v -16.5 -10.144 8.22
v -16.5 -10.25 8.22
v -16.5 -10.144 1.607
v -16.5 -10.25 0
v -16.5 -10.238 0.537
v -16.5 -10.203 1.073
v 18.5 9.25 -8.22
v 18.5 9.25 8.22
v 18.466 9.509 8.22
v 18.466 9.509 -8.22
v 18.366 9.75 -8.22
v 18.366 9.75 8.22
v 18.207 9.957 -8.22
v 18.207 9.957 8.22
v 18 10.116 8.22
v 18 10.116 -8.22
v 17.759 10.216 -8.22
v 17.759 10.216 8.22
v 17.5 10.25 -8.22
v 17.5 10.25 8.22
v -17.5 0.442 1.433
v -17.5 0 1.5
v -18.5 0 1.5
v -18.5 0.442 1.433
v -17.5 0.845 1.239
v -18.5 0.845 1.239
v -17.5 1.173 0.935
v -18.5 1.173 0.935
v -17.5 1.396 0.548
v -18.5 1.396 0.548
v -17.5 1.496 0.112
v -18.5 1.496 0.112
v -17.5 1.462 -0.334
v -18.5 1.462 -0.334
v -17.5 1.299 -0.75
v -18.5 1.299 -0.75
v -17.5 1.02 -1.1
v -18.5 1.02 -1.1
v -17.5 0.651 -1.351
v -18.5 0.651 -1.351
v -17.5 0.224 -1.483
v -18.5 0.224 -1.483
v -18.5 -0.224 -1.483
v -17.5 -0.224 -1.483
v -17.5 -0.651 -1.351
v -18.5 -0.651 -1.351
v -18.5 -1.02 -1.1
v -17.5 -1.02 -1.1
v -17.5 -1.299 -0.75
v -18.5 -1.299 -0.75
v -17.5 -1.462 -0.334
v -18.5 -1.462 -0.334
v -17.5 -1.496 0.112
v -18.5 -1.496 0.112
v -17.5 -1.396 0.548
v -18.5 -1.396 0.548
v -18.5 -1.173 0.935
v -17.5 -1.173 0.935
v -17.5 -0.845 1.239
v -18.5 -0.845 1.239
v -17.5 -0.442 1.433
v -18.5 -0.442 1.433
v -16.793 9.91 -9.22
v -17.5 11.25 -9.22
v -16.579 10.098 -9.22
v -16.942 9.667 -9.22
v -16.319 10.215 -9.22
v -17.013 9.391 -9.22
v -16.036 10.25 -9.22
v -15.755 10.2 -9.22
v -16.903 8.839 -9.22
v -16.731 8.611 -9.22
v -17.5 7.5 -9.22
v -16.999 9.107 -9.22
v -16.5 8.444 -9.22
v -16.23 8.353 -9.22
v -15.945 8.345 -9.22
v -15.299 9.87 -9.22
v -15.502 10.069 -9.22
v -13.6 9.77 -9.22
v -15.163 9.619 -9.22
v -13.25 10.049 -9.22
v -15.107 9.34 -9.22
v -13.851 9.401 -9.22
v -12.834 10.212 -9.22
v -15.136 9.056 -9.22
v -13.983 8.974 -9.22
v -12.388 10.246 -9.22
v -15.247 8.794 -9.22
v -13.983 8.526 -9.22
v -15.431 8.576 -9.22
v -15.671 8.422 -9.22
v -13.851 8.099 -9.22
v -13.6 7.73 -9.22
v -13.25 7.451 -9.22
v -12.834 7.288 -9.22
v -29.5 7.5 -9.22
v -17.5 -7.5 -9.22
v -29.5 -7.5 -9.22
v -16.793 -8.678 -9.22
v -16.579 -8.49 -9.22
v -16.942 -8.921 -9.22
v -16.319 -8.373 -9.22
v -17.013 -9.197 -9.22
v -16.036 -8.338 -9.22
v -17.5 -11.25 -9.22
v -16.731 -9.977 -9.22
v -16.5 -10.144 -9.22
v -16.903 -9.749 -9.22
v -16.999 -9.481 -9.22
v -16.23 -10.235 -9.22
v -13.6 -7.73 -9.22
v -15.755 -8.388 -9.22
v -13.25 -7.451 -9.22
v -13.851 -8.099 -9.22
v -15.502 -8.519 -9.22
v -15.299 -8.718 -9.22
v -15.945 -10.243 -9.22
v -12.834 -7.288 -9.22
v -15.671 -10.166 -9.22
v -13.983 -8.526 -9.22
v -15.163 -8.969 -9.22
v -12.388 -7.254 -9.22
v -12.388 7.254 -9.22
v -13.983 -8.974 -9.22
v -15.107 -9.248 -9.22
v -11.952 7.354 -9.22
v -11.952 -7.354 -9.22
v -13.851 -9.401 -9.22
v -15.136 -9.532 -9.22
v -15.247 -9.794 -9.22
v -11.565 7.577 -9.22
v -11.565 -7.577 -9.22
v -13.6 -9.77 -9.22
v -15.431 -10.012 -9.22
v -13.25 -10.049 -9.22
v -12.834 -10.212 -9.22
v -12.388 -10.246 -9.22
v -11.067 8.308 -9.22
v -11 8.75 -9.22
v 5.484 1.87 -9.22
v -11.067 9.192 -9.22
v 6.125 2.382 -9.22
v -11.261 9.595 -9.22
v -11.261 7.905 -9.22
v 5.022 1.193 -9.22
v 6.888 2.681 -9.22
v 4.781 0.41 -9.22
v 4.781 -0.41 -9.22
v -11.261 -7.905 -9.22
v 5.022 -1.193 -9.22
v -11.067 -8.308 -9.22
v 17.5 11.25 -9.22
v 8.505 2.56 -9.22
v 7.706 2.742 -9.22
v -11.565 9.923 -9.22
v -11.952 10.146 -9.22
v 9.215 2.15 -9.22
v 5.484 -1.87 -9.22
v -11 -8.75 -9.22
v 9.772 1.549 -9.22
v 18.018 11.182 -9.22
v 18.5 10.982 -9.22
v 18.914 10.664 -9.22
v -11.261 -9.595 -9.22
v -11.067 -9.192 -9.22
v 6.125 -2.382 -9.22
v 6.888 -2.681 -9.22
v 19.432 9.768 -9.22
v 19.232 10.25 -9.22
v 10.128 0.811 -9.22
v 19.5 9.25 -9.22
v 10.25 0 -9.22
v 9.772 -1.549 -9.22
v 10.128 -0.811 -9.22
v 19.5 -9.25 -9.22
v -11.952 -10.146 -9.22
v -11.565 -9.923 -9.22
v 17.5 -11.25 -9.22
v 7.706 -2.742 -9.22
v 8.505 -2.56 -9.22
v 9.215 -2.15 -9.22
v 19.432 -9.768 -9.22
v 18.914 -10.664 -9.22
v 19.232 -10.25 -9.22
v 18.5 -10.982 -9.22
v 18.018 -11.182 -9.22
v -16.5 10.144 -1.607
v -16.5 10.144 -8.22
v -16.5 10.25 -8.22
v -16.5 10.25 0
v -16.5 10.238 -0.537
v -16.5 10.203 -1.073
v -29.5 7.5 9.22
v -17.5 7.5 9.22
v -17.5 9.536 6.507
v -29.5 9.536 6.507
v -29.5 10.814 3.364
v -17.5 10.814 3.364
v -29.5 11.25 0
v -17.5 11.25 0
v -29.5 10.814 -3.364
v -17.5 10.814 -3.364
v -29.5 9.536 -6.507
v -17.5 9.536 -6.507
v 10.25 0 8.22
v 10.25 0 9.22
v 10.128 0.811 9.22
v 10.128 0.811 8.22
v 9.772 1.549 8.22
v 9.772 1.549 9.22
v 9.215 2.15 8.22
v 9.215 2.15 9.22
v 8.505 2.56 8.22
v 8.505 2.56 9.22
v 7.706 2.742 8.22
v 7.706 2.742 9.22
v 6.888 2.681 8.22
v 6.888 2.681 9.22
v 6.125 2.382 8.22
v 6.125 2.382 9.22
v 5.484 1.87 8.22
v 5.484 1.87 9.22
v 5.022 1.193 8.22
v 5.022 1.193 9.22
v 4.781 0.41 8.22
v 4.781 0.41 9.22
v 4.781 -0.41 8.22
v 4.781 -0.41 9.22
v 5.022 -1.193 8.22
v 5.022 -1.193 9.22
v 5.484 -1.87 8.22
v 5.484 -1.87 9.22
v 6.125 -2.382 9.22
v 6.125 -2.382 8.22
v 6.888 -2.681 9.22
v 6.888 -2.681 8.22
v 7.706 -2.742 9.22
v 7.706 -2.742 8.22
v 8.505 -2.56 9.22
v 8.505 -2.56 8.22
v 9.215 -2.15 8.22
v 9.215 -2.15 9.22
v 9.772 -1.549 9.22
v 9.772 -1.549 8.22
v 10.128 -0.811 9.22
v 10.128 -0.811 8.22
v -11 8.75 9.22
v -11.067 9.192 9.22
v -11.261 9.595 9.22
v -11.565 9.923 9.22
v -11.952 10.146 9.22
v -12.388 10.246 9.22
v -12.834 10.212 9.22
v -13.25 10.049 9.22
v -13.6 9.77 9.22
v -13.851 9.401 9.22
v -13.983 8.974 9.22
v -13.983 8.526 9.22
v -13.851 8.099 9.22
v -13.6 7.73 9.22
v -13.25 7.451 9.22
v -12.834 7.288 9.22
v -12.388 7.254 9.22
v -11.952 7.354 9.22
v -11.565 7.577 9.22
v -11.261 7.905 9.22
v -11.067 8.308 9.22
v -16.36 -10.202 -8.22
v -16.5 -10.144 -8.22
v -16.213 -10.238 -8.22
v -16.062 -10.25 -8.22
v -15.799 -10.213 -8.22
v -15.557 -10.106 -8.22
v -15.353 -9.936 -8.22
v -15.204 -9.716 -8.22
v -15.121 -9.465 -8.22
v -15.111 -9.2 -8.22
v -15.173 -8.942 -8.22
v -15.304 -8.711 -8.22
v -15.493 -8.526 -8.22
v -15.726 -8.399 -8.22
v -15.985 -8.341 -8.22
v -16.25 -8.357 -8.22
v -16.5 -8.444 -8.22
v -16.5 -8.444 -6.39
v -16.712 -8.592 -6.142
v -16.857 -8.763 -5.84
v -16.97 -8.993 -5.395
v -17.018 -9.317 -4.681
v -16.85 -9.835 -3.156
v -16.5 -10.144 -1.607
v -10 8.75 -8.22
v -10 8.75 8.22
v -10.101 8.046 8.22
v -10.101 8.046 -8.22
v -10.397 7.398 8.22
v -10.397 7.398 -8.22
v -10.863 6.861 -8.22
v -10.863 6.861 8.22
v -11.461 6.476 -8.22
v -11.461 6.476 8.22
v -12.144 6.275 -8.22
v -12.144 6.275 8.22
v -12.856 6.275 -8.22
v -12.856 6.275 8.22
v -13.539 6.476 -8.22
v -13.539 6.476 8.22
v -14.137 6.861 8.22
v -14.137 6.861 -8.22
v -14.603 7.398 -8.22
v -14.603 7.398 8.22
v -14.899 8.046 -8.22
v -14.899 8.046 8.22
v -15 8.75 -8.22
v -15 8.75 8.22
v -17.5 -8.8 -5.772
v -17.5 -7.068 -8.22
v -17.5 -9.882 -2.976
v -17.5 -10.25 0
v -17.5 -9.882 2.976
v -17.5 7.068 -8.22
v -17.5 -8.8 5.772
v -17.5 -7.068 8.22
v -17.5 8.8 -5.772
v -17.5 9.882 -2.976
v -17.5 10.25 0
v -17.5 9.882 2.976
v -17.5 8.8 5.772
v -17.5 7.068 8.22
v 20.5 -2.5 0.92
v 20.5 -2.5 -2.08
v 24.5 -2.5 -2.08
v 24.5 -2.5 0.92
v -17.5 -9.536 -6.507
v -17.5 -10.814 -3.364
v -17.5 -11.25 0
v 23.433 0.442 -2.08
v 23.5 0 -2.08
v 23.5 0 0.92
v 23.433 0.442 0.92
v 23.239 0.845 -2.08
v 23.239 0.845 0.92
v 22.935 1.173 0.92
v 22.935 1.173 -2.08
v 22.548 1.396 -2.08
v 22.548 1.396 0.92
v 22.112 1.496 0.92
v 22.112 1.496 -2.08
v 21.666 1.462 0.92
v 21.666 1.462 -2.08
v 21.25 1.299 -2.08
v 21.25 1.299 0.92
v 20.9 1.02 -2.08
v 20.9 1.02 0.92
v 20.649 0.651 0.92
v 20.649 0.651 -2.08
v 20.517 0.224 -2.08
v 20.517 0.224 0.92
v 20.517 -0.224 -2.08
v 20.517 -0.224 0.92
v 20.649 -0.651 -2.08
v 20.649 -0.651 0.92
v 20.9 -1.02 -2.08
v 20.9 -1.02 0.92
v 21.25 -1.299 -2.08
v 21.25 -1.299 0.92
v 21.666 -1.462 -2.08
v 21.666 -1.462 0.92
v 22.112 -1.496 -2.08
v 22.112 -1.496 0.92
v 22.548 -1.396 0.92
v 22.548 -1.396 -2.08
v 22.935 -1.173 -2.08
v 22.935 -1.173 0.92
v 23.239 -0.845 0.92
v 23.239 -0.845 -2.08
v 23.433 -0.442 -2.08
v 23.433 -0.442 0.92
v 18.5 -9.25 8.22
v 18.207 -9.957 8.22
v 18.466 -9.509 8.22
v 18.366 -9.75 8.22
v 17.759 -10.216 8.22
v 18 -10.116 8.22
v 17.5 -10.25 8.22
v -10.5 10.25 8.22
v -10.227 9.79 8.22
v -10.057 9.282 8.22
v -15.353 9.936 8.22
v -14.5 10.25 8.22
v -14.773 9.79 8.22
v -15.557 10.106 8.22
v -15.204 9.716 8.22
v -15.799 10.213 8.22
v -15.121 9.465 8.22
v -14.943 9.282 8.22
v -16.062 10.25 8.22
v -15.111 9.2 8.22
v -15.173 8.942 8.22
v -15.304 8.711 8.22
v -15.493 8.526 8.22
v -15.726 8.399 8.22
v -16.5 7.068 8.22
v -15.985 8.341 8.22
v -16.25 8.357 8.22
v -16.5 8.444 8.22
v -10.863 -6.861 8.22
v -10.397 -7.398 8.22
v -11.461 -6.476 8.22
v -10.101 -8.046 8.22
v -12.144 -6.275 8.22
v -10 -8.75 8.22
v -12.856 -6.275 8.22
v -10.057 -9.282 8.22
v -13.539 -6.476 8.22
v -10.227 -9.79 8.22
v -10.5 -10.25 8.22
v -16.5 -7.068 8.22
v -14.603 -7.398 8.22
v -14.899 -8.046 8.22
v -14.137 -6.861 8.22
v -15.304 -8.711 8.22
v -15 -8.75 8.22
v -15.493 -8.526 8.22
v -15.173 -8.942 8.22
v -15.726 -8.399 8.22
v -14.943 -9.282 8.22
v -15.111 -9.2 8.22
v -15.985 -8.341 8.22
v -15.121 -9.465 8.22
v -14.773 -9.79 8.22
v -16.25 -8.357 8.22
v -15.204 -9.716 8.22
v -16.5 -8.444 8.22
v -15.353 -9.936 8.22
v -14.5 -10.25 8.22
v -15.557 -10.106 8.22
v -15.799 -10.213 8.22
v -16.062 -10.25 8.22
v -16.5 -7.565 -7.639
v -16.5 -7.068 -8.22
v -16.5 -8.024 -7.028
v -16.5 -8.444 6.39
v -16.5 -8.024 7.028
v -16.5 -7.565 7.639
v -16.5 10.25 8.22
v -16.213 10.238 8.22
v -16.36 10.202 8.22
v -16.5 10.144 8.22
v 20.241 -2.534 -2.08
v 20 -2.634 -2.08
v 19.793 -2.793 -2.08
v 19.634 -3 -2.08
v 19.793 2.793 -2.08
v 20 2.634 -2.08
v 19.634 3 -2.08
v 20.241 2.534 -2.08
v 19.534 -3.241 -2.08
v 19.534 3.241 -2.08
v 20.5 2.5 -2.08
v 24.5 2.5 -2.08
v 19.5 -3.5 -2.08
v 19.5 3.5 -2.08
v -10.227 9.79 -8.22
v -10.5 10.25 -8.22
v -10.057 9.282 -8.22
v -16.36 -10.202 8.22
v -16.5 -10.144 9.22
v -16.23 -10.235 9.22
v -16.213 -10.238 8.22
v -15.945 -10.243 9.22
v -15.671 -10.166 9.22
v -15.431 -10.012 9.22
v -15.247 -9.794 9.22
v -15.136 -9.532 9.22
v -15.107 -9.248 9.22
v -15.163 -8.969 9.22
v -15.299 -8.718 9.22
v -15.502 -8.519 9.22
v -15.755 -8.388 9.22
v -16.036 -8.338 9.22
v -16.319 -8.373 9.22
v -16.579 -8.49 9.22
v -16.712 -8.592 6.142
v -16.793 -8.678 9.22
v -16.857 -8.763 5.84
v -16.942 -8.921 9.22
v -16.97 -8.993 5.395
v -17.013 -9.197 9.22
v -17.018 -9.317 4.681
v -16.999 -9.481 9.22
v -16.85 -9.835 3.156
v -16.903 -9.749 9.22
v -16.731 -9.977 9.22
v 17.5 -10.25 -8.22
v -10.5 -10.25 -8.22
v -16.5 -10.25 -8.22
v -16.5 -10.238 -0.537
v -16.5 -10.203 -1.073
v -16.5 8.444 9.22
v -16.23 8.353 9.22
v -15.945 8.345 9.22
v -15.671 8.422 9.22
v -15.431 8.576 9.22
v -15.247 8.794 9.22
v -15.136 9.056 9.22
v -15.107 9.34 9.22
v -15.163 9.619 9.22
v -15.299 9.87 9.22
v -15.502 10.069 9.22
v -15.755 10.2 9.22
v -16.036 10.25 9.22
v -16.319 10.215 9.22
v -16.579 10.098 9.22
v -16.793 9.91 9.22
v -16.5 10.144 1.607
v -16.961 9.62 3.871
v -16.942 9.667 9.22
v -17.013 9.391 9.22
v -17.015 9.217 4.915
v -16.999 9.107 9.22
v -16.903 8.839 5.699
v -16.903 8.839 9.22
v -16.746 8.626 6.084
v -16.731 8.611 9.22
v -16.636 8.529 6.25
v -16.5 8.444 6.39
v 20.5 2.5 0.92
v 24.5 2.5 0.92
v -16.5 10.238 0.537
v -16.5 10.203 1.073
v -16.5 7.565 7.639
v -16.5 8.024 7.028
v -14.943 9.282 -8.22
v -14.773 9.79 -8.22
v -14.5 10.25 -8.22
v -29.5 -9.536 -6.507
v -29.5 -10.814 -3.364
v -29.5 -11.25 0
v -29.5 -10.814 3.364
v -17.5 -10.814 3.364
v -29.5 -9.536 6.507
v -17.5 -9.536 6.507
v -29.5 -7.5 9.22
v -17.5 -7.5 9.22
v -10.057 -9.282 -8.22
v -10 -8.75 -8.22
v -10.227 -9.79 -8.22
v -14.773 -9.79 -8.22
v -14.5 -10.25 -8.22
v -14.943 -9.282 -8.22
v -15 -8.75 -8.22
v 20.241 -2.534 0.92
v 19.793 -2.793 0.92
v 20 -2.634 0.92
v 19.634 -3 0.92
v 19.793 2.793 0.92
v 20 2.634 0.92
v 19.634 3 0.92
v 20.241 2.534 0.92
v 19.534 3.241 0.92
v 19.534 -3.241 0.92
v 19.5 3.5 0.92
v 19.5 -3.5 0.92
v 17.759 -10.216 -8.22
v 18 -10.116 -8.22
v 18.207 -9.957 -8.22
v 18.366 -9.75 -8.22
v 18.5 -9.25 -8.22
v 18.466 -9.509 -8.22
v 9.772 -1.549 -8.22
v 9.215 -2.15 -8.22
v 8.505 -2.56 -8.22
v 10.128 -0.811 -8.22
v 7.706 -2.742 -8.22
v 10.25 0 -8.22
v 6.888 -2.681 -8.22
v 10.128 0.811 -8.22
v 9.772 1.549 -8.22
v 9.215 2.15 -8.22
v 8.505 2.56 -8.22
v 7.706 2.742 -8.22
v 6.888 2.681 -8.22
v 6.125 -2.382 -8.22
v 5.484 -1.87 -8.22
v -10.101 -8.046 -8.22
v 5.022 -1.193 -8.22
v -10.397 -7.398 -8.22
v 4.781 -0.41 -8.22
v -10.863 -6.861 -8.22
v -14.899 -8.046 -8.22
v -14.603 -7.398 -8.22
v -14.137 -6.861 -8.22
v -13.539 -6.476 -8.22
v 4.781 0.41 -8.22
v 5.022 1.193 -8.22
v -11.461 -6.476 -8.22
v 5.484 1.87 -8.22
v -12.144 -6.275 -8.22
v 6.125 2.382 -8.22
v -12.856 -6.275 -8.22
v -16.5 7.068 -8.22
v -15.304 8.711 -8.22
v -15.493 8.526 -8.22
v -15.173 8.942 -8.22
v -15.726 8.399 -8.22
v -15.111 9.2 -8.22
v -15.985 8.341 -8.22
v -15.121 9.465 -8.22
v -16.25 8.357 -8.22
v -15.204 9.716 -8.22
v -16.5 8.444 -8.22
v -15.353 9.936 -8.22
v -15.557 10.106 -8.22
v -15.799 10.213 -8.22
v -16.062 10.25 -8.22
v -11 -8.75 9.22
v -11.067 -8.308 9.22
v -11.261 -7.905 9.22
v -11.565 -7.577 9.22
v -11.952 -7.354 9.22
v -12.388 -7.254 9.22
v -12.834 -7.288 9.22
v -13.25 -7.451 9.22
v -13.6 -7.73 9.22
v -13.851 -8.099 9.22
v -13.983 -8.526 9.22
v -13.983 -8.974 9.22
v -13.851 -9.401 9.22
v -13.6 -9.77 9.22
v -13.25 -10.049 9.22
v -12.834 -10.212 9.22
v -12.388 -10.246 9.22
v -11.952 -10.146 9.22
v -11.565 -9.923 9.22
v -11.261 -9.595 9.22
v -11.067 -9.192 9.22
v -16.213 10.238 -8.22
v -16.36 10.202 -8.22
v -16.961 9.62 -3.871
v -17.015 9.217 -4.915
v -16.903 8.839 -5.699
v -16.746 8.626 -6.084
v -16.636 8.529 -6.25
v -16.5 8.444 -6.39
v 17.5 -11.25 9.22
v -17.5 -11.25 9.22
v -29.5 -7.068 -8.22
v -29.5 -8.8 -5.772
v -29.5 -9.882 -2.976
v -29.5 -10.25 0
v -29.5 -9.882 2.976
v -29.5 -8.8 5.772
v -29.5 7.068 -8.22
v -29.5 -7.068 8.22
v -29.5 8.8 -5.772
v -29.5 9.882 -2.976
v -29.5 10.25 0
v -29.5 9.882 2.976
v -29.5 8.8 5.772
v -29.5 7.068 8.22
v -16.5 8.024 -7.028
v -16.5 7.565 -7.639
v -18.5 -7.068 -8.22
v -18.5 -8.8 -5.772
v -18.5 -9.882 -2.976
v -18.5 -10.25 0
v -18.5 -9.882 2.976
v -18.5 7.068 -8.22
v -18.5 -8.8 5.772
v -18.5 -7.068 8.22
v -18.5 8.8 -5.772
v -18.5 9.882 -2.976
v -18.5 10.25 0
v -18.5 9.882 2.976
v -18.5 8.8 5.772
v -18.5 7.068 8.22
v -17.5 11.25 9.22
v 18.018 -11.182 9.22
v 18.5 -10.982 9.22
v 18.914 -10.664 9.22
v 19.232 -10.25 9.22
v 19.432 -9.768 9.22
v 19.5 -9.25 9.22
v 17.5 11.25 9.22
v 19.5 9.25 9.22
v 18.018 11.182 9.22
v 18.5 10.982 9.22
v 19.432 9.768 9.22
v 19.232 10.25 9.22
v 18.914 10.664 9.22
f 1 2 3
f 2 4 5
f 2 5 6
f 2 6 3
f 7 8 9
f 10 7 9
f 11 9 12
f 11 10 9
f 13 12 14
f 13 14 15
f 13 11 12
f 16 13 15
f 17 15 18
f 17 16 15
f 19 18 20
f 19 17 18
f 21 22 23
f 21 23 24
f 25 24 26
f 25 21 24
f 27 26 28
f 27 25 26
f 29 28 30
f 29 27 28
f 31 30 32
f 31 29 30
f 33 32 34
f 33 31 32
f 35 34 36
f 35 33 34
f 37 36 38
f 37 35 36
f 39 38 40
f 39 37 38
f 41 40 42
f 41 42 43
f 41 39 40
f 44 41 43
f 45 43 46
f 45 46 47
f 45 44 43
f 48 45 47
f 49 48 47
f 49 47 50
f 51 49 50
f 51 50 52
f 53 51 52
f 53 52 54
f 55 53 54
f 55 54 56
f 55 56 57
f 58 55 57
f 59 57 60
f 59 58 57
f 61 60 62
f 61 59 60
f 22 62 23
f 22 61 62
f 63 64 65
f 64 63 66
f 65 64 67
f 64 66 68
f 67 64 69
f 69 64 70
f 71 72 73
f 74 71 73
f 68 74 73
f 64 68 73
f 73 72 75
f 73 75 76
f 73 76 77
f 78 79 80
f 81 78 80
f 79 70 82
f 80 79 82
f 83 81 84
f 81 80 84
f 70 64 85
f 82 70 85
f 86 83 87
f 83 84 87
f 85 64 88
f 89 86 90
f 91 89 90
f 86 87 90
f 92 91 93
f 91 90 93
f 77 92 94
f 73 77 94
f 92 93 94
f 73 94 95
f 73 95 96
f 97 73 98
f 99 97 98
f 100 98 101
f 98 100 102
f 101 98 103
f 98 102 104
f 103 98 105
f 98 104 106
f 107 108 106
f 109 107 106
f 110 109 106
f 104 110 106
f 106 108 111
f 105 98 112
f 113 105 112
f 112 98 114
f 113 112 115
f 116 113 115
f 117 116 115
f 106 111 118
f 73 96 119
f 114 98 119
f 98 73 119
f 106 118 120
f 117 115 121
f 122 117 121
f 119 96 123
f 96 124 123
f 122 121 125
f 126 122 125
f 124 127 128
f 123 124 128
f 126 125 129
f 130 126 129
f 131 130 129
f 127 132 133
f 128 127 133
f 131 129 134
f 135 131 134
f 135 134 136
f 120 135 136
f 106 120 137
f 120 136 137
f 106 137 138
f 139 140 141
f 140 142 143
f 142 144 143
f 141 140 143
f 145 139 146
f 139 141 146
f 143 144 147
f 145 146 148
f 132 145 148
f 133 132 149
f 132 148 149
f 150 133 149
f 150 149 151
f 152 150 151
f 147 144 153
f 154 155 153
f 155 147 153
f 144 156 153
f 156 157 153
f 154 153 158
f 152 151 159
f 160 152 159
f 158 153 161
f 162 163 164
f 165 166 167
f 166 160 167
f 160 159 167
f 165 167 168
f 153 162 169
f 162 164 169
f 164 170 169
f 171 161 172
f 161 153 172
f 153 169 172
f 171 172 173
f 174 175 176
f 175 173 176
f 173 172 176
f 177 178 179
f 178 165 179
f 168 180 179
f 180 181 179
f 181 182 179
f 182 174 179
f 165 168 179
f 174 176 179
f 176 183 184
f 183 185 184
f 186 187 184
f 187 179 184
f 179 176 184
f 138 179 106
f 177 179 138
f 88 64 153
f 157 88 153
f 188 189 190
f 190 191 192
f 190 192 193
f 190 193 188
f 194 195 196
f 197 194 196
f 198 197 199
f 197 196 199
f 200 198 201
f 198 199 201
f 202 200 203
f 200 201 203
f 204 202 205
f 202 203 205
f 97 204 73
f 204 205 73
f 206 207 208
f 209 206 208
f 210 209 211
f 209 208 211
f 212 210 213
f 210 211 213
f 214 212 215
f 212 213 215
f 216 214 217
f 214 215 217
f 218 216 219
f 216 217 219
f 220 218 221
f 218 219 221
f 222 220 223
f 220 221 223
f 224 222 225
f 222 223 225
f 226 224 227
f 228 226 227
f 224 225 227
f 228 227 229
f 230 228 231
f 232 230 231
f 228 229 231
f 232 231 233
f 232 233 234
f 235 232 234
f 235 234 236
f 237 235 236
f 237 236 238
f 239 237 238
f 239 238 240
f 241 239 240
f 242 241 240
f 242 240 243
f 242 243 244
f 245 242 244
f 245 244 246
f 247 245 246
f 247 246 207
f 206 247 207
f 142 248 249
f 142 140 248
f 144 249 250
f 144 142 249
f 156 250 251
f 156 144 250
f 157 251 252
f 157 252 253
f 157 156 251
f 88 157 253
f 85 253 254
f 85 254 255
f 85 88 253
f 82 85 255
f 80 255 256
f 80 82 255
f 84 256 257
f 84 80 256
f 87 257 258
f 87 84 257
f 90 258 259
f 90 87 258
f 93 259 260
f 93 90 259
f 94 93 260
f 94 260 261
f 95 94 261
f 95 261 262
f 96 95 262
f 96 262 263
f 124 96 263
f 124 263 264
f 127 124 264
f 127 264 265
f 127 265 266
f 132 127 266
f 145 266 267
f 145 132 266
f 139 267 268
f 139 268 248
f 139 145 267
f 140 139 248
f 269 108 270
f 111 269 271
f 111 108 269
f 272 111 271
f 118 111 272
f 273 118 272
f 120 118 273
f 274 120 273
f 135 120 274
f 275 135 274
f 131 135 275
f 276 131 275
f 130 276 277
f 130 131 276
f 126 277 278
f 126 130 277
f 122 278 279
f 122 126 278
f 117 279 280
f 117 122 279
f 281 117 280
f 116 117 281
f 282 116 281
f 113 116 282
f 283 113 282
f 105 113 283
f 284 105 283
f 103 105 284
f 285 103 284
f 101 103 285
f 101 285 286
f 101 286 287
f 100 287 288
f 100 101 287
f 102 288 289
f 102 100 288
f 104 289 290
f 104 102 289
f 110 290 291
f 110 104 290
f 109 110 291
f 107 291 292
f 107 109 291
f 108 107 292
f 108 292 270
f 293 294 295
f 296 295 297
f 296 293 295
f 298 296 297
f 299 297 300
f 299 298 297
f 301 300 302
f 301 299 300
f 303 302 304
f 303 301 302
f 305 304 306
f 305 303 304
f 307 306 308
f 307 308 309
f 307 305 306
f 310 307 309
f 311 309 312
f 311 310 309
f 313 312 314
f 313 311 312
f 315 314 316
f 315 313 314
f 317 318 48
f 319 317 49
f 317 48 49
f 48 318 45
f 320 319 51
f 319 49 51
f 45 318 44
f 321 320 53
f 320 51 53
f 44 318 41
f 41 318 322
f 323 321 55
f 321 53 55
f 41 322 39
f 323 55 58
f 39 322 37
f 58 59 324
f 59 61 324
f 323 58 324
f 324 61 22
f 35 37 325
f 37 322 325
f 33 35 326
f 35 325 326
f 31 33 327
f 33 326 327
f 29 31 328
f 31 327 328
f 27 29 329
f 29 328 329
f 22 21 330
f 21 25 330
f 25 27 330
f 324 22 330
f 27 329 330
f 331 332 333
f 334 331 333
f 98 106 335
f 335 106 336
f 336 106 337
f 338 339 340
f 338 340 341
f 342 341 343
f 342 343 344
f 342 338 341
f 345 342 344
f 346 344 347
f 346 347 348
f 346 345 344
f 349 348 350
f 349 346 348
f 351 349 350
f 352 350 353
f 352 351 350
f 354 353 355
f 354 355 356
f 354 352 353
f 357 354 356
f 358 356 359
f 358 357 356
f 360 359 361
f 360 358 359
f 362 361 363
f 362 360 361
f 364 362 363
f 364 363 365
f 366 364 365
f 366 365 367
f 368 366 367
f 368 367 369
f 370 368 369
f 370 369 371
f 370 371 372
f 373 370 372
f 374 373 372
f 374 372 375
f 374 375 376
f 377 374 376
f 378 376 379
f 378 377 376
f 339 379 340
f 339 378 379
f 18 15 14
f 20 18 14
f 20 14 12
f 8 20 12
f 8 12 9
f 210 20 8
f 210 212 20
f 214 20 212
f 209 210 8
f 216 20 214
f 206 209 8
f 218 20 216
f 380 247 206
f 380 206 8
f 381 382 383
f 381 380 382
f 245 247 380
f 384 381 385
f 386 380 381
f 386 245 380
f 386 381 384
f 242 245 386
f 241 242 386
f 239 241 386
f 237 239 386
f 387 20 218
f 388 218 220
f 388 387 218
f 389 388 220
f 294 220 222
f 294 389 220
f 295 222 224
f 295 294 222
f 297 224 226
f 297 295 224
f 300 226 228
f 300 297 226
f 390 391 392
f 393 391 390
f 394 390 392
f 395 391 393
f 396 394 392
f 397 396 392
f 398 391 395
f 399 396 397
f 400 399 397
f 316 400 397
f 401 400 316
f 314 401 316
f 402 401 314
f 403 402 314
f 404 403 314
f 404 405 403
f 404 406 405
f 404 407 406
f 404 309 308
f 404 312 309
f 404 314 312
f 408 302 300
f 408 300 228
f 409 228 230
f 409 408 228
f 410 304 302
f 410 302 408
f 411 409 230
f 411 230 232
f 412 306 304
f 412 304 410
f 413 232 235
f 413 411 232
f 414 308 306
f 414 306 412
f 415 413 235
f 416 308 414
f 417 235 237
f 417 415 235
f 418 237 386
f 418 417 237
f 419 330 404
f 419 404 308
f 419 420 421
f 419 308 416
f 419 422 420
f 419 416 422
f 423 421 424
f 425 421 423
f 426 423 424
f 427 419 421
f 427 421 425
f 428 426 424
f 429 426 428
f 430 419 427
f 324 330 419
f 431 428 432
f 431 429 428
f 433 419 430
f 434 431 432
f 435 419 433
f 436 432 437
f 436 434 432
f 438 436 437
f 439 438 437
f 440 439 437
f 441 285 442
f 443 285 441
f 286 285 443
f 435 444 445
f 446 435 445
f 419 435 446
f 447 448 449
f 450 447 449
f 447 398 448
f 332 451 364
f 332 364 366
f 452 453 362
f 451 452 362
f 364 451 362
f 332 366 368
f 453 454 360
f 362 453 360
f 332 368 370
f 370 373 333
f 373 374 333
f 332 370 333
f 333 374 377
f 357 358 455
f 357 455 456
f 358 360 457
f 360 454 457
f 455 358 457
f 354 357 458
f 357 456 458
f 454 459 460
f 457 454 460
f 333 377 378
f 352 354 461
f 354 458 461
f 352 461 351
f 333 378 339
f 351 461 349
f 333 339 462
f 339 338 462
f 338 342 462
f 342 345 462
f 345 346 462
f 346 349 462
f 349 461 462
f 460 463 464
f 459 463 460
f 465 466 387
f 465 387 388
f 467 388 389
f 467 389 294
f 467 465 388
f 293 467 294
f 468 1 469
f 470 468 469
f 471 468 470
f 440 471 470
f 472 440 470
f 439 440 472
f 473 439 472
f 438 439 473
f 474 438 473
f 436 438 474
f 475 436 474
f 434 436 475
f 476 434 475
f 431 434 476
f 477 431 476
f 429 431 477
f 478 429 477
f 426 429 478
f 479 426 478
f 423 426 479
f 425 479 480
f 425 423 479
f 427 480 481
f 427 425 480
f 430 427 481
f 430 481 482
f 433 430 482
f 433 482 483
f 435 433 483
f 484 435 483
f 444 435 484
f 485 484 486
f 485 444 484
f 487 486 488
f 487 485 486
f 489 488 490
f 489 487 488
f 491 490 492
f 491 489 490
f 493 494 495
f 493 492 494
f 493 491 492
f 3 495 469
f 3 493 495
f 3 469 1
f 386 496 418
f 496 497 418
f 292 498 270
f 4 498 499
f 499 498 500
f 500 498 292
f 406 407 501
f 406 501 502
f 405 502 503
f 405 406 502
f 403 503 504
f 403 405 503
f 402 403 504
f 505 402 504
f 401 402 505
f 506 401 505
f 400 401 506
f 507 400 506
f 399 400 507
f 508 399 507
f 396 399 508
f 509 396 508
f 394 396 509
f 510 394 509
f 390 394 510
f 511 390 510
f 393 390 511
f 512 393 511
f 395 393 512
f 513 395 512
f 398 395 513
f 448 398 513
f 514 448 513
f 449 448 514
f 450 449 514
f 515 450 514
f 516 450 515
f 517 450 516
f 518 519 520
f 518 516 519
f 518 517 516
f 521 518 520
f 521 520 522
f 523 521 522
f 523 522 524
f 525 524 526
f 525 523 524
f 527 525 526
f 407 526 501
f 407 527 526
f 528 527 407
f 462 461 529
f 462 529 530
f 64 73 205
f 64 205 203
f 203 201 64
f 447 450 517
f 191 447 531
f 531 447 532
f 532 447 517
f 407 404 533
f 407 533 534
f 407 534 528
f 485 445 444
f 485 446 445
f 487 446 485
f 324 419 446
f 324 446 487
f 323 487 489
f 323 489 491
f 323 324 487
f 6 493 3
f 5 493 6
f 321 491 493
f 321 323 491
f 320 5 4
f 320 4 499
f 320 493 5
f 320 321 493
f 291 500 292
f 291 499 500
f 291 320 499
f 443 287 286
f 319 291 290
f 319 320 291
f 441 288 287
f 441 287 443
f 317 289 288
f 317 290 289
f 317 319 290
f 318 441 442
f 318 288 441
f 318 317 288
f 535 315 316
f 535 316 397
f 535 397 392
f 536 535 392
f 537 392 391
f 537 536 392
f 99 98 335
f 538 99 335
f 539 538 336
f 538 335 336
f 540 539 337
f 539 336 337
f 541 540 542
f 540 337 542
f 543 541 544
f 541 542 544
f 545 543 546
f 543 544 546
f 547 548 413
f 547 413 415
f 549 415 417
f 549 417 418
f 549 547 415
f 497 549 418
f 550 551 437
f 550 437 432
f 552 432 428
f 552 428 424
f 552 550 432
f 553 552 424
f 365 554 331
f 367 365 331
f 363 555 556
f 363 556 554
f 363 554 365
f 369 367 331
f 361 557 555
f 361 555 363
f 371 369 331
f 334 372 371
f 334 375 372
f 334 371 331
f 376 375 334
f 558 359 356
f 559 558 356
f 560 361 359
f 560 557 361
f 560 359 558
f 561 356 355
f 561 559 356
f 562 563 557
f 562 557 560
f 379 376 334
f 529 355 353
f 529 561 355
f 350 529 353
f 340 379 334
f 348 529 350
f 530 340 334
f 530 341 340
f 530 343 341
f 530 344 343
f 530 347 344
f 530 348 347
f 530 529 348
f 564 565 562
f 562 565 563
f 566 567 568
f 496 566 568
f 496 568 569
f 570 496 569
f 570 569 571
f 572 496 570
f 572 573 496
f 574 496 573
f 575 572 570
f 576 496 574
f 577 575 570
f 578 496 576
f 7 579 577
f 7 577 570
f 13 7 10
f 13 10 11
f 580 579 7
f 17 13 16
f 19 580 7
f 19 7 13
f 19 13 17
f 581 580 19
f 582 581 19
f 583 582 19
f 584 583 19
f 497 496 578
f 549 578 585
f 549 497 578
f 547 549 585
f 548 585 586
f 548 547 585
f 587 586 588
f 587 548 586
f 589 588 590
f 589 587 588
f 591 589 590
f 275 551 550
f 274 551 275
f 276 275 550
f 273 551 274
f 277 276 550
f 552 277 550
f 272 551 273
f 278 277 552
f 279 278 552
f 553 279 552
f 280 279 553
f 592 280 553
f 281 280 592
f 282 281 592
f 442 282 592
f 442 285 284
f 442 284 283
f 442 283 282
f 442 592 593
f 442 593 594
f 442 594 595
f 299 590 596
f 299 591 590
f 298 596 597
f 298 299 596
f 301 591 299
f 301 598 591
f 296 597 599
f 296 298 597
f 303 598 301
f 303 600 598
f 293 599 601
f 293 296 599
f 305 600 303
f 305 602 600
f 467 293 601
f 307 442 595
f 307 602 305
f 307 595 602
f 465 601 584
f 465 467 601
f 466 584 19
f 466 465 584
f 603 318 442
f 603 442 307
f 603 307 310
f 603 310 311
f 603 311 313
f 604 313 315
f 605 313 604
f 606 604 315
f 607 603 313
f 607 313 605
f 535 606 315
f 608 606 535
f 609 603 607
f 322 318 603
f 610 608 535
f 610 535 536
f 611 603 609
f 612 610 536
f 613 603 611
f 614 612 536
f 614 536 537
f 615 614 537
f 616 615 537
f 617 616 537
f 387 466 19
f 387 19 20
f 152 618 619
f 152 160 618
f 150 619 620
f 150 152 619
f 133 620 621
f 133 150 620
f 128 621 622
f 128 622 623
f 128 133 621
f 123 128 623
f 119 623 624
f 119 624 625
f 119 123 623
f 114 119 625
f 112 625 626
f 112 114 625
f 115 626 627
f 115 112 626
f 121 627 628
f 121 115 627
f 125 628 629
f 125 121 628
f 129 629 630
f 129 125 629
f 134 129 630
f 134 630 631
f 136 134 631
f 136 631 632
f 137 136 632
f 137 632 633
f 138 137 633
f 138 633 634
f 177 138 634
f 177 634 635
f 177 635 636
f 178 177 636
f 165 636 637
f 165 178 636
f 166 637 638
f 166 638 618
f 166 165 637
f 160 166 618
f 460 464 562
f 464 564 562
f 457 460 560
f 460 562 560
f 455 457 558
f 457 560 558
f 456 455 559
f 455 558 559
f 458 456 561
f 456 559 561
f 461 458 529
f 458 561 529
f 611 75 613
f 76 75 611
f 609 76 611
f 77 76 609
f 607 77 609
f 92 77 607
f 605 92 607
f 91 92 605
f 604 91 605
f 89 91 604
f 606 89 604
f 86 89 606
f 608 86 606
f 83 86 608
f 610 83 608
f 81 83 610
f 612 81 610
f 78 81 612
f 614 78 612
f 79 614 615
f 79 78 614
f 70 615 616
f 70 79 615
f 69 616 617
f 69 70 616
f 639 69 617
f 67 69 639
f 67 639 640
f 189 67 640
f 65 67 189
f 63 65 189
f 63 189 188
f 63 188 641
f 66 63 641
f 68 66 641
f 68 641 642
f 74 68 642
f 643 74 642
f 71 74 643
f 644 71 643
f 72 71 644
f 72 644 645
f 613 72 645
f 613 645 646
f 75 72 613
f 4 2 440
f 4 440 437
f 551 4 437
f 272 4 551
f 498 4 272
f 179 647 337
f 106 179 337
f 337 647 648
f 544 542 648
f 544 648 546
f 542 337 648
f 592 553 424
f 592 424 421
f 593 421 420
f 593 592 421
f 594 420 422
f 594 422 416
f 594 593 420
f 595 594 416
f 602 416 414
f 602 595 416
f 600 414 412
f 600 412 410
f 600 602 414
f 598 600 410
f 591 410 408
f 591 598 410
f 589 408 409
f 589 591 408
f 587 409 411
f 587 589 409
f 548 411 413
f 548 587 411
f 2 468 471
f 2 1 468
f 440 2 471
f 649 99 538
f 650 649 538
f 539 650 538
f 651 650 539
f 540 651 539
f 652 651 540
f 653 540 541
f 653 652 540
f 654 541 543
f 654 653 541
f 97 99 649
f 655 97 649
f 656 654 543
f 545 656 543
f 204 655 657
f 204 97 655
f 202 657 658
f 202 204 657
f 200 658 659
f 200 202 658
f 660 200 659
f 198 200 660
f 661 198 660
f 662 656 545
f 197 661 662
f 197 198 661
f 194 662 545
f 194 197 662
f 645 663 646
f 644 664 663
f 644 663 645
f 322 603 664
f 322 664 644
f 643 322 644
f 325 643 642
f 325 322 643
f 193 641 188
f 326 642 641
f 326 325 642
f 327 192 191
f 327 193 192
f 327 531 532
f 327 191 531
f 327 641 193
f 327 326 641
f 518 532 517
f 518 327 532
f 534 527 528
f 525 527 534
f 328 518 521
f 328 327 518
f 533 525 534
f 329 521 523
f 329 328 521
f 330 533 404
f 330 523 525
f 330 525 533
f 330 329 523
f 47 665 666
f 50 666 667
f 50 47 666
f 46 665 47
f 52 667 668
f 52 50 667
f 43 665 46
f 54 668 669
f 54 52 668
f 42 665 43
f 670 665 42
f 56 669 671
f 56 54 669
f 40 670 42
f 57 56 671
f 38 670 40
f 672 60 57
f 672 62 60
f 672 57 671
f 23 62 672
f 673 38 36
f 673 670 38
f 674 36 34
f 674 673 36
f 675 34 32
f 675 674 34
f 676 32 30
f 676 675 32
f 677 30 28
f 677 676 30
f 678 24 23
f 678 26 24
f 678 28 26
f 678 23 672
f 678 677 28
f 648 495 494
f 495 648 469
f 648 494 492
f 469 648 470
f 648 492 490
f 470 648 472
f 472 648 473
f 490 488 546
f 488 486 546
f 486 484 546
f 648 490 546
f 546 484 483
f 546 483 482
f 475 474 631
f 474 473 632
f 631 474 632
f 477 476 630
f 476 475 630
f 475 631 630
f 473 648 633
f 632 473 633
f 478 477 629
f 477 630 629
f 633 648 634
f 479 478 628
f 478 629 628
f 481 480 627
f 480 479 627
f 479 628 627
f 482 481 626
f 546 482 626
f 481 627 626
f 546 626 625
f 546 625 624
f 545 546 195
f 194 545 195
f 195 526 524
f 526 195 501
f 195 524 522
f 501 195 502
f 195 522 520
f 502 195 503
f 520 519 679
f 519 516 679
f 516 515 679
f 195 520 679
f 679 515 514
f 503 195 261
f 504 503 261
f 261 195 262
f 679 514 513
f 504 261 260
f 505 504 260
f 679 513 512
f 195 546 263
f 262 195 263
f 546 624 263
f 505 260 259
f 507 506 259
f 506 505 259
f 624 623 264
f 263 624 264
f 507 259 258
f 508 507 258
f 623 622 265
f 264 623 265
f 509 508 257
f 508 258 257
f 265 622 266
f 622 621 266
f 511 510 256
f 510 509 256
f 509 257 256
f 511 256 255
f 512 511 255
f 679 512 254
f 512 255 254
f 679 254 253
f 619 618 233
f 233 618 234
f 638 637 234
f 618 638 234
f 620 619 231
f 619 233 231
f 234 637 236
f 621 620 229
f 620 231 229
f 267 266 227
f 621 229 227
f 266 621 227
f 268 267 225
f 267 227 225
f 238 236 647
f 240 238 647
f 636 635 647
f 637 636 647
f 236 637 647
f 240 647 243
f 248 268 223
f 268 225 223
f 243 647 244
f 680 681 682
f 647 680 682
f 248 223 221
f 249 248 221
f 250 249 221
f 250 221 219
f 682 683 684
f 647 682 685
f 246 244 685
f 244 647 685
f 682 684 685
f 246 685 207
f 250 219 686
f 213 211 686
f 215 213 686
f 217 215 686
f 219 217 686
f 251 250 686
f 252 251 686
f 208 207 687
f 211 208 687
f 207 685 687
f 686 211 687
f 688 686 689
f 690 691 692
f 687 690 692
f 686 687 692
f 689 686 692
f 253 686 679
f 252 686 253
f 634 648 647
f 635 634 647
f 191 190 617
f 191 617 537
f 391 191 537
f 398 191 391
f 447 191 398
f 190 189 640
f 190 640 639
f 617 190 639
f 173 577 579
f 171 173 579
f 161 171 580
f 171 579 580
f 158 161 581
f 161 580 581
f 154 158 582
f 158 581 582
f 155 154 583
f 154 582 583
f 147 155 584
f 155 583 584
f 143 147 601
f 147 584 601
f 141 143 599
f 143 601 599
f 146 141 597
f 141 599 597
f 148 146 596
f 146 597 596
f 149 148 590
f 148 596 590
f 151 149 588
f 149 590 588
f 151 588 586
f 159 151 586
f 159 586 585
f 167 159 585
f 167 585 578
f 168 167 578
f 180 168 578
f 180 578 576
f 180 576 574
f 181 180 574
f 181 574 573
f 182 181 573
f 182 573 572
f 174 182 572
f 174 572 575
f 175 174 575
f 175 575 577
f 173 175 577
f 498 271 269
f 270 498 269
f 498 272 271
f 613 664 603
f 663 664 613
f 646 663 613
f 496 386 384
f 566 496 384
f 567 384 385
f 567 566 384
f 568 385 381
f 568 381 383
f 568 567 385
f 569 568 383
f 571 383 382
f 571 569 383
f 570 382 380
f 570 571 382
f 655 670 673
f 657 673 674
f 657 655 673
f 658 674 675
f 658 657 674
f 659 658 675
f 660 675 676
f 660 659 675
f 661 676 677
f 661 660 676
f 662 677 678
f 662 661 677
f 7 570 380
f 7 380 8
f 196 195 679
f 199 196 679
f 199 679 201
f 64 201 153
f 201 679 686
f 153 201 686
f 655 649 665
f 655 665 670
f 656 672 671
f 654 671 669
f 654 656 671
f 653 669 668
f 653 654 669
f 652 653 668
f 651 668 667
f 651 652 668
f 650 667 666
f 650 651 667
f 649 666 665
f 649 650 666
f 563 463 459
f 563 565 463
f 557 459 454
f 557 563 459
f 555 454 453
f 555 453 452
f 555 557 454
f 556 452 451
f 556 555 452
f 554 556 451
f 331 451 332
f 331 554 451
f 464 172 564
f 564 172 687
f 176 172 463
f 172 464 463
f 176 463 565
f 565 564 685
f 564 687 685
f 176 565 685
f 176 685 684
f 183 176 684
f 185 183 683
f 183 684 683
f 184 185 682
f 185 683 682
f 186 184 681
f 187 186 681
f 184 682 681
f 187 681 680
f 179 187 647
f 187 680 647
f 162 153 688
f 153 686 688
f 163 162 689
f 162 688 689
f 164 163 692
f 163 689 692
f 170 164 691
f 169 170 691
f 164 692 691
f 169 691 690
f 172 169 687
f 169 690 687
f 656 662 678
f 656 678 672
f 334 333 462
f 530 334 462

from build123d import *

# Parameters (mm, degrees)
SKETCH1_R                = 1.5
BOSS_EXTRUDE1_DEPTH      = 9.22
BOSS_EXTRUDE2_DEPTH      = 12
SHELL1_START             = -10
SHELL1_OUTLINE_W         = 20.5
SHELL1_OUTLINE_H         = 16.44
SHELL1_DEPTH             = 27.5
SHELL1_START_2           = -29.5
SHELL1_2_DEPTH           = 14.5
SHELL1_START_3           = -16.5
SHELL1_3_DEPTH           = 1.5
SHELL1_START_4           = -8.22
SHELL1_4_DEPTH           = 16.44
SKETCH3_R                = 1.5
BOSS_EXTRUDE3_DEPTH      = 1
BOSS_EXTRUDE4_DEPTH      = 1.5
BOSS_EXTRUDE4_DEPTH_BACK = 1.5
SKETCH6_W                = 5
SKETCH6_H                = 5
SKETCH6_R                = 1.5
SKETCH7_R                = 2.75
CUT_EXTRUDE1_DEPTH       = 37.562906066
FILLET1_R                = 1
CUT_EXTRUDE2_DEPTH       = 20
CUT_EXTRUDE2_DEPTH_BACK  = 20
SKETCH8_R                = 0.956029162


with BuildPart() as part:
    # Sketch1 → Boss-Extrude1 (new, symmetric)
    with BuildSketch(Plane.XY):
        with BuildLine():
            Line((17.5, -11.25), (-17.5, -11.25))
            Line((-17.5, -11.25), (-17.5, 11.25))
            Line((-17.5, 11.25), (17.5, 11.25))
            ThreePointArc((17.5, 11.25), (18.914213562, 10.664213562), (19.5, 9.25))
            Line((19.5, 9.25), (19.5, -9.25))
            ThreePointArc((19.5, -9.25), (18.914213562, -10.664213562), (17.5, -11.25))
        make_face()
        with Locations((-12.5, 8.75)):
            Circle(SKETCH1_R, mode=Mode.SUBTRACT)
        with Locations((-12.5, -8.75)):
            Circle(SKETCH1_R, mode=Mode.SUBTRACT)
    extrude(amount=BOSS_EXTRUDE1_DEPTH, both=True)

    # Sketch2 → Boss-Extrude2 (add)
    with BuildSketch(Plane.ZY.offset(17.5)):
        with BuildLine():
            Line((9.22, -7.5), (9.22, 7.5))
            ThreePointArc((9.22, 7.5), (0, 11.25), (-9.22, 7.5))
            Line((-9.22, 7.5), (-9.22, -7.5))
            ThreePointArc((-9.22, -7.5), (0, -11.25), (9.22, -7.5))
        make_face()
    extrude(amount=BOSS_EXTRUDE2_DEPTH)

    # Shell1: read off the stored shape, not the designer's step
    # Shell1 outline → Shell1 (cut)
    with BuildSketch(Plane.YZ.offset(SHELL1_START)):
        Rectangle(SHELL1_OUTLINE_W, SHELL1_OUTLINE_H)
    extrude(amount=SHELL1_DEPTH, mode=Mode.SUBTRACT)

    # Shell1 2 outline → Shell1 2 (cut)
    with BuildSketch(Plane.YZ.offset(SHELL1_START_2)):
        with BuildLine():
            ThreePointArc((7.068411902, -8.22), (10.25, 0), (7.068411902, 8.22))
            Line((7.068411902, 8.22), (-7.068411902, 8.22))
            ThreePointArc((-7.068411902, 8.22), (-10.25, 0), (-7.068411902, -8.22))
            Line((-7.068411902, -8.22), (7.068411902, -8.22))
        make_face()
    extrude(amount=SHELL1_2_DEPTH, mode=Mode.SUBTRACT)

    # Shell1 3 outline → Shell1 3 (cut)
    with BuildSketch(Plane.YZ.offset(SHELL1_START_3)):
        with BuildLine():
            Line((10.25, 0), (10.25, 8.22))
            Line((10.25, 8.22), (7.068411902, 8.22))
            ThreePointArc((7.068411902, 8.22), (9.426855331, 4.407122157), (10.25, 0))
        make_face()
        with BuildLine():
            Line((10.25, -8.22), (10.25, 0))
            ThreePointArc((10.25, 0), (9.426855331, -4.407122157), (7.068411902, -8.22))
            Line((7.068411902, -8.22), (10.25, -8.22))
        make_face()
        with BuildLine():
            ThreePointArc((-10.25, 0), (-9.426855331, 4.407122157), (-7.068411902, 8.22))
            Line((-7.068411902, 8.22), (-10.25, 8.22))
            Line((-10.25, 8.22), (-10.25, 0))
        make_face()
        with BuildLine():
            Line((-10.25, -8.22), (-7.068411902, -8.22))
            ThreePointArc((-7.068411902, -8.22), (-9.426855331, -4.407122157), (-10.25, 0))
            Line((-10.25, 0), (-10.25, -8.22))
        make_face()
    extrude(amount=SHELL1_3_DEPTH, mode=Mode.SUBTRACT)

    # Shell1 4 outline → Shell1 4 (cut)
    with BuildSketch(Plane.XY.offset(SHELL1_START_4)):
        with BuildLine():
            ThreePointArc((-14.5, -10.25), (-14.871708245, -9.540569415), (-15, -8.75))
            Line((-15, -8.75), (-15, -10.25))
            Line((-15, -10.25), (-14.5, -10.25))
        make_face()
        with BuildLine():
            ThreePointArc((-10, 8.75), (-12.499999993, 6.25), (-15, 8.749999987))
            Line((-15, 8.749999987), (-15, -8.75))
            ThreePointArc((-15, -8.75), (-12.5, -6.25), (-10, -8.75))
            Line((-10, -8.75), (-10, 8.75))
        make_face()
        with BuildLine():
            Line((-14.5, 10.25), (-15, 10.25))
            Line((-15, 10.25), (-15, 8.749999987))
            ThreePointArc((-15, 8.749999987), (-14.871708247, 9.540569409), (-14.5, 10.25))
        make_face()
        with BuildLine():
            ThreePointArc((-10.5, 10.25), (-10.128291755, 9.540569415), (-10, 8.75))
            Line((-10, 8.75), (-10, 10.25))
            Line((-10, 10.25), (-10.5, 10.25))
        make_face()
        with BuildLine():
            Line((-10, -10.25), (-10, -8.75))
            ThreePointArc((-10, -8.75), (-10.128291755, -9.540569415), (-10.5, -10.25))
            Line((-10.5, -10.25), (-10, -10.25))
        make_face()
        with BuildLine():
            ThreePointArc((18.5, 9.25), (18.207106781, 9.957106781), (17.5, 10.25))
            Line((17.5, 10.25), (17.5, -10.25))
            ThreePointArc((17.5, -10.25), (18.207106781, -9.957106781), (18.5, -9.25))
            Line((18.5, -9.25), (18.5, 9.25))
        make_face()
    extrude(amount=SHELL1_4_DEPTH, mode=Mode.SUBTRACT)

    # Sketch3 → Boss-Extrude3 (add)
    with BuildSketch(Plane.ZY.offset(17.5)):
        with BuildLine():
            Line((-9.22, 7.5), (-9.22, -7.5))
            ThreePointArc((-9.22, -7.5), (0, -11.25), (9.22, -7.5))
            Line((9.22, -7.5), (9.22, 7.5))
            ThreePointArc((9.22, 7.5), (0, 11.25), (-9.22, 7.5))
        make_face()
        Circle(SKETCH3_R, mode=Mode.SUBTRACT)
    extrude(amount=BOSS_EXTRUDE3_DEPTH)

    # Sketch6 → Boss-Extrude4 (add, two sides: drawn at the far end of the back side and taken through both)
    with BuildSketch(Plane.XY.offset(-0.58).offset(-BOSS_EXTRUDE4_DEPTH_BACK)):
        with Locations((22, 0)):
            Rectangle(SKETCH6_W, SKETCH6_H)
        with Locations((22, 0)):
            Circle(SKETCH6_R, mode=Mode.SUBTRACT)
    extrude(amount=BOSS_EXTRUDE4_DEPTH + BOSS_EXTRUDE4_DEPTH_BACK)

    # Sketch7 → Cut-Extrude1 (cut, through all)
    with BuildSketch(Plane.XY.offset(9.22)):
        with Locations((7.5, 0)):
            Circle(SKETCH7_R)
    extrude(amount=-CUT_EXTRUDE1_DEPTH, mode=Mode.SUBTRACT)

    # Fillet1
    fillet1_edges = [part.edges().sort_by_distance(p)[0] for p in [
        (19.5, 2.5, -0.58),
        (19.5, -2.5, -0.58),
    ]]
    fillet(fillet1_edges, radius=FILLET1_R)

    # Sketch8 → Cut-Extrude2 (cut, two sides: drawn at the far end of the back side and taken through both)
    with BuildSketch(Plane.XY.offset(-0.58).offset(-CUT_EXTRUDE2_DEPTH_BACK)):
        with Locations(Location((-16.061963922, 9.293970838, 0), (0, 0, 242.73008166))):
            Circle(SKETCH8_R)
        with Locations(Location((-16.061963922, -9.293970838, 0), (0, 0, 242.730056197))):
            Circle(SKETCH8_R)
    extrude(amount=CUT_EXTRUDE2_DEPTH + CUT_EXTRUDE2_DEPTH_BACK, mode=Mode.SUBTRACT)


solid = part.part
